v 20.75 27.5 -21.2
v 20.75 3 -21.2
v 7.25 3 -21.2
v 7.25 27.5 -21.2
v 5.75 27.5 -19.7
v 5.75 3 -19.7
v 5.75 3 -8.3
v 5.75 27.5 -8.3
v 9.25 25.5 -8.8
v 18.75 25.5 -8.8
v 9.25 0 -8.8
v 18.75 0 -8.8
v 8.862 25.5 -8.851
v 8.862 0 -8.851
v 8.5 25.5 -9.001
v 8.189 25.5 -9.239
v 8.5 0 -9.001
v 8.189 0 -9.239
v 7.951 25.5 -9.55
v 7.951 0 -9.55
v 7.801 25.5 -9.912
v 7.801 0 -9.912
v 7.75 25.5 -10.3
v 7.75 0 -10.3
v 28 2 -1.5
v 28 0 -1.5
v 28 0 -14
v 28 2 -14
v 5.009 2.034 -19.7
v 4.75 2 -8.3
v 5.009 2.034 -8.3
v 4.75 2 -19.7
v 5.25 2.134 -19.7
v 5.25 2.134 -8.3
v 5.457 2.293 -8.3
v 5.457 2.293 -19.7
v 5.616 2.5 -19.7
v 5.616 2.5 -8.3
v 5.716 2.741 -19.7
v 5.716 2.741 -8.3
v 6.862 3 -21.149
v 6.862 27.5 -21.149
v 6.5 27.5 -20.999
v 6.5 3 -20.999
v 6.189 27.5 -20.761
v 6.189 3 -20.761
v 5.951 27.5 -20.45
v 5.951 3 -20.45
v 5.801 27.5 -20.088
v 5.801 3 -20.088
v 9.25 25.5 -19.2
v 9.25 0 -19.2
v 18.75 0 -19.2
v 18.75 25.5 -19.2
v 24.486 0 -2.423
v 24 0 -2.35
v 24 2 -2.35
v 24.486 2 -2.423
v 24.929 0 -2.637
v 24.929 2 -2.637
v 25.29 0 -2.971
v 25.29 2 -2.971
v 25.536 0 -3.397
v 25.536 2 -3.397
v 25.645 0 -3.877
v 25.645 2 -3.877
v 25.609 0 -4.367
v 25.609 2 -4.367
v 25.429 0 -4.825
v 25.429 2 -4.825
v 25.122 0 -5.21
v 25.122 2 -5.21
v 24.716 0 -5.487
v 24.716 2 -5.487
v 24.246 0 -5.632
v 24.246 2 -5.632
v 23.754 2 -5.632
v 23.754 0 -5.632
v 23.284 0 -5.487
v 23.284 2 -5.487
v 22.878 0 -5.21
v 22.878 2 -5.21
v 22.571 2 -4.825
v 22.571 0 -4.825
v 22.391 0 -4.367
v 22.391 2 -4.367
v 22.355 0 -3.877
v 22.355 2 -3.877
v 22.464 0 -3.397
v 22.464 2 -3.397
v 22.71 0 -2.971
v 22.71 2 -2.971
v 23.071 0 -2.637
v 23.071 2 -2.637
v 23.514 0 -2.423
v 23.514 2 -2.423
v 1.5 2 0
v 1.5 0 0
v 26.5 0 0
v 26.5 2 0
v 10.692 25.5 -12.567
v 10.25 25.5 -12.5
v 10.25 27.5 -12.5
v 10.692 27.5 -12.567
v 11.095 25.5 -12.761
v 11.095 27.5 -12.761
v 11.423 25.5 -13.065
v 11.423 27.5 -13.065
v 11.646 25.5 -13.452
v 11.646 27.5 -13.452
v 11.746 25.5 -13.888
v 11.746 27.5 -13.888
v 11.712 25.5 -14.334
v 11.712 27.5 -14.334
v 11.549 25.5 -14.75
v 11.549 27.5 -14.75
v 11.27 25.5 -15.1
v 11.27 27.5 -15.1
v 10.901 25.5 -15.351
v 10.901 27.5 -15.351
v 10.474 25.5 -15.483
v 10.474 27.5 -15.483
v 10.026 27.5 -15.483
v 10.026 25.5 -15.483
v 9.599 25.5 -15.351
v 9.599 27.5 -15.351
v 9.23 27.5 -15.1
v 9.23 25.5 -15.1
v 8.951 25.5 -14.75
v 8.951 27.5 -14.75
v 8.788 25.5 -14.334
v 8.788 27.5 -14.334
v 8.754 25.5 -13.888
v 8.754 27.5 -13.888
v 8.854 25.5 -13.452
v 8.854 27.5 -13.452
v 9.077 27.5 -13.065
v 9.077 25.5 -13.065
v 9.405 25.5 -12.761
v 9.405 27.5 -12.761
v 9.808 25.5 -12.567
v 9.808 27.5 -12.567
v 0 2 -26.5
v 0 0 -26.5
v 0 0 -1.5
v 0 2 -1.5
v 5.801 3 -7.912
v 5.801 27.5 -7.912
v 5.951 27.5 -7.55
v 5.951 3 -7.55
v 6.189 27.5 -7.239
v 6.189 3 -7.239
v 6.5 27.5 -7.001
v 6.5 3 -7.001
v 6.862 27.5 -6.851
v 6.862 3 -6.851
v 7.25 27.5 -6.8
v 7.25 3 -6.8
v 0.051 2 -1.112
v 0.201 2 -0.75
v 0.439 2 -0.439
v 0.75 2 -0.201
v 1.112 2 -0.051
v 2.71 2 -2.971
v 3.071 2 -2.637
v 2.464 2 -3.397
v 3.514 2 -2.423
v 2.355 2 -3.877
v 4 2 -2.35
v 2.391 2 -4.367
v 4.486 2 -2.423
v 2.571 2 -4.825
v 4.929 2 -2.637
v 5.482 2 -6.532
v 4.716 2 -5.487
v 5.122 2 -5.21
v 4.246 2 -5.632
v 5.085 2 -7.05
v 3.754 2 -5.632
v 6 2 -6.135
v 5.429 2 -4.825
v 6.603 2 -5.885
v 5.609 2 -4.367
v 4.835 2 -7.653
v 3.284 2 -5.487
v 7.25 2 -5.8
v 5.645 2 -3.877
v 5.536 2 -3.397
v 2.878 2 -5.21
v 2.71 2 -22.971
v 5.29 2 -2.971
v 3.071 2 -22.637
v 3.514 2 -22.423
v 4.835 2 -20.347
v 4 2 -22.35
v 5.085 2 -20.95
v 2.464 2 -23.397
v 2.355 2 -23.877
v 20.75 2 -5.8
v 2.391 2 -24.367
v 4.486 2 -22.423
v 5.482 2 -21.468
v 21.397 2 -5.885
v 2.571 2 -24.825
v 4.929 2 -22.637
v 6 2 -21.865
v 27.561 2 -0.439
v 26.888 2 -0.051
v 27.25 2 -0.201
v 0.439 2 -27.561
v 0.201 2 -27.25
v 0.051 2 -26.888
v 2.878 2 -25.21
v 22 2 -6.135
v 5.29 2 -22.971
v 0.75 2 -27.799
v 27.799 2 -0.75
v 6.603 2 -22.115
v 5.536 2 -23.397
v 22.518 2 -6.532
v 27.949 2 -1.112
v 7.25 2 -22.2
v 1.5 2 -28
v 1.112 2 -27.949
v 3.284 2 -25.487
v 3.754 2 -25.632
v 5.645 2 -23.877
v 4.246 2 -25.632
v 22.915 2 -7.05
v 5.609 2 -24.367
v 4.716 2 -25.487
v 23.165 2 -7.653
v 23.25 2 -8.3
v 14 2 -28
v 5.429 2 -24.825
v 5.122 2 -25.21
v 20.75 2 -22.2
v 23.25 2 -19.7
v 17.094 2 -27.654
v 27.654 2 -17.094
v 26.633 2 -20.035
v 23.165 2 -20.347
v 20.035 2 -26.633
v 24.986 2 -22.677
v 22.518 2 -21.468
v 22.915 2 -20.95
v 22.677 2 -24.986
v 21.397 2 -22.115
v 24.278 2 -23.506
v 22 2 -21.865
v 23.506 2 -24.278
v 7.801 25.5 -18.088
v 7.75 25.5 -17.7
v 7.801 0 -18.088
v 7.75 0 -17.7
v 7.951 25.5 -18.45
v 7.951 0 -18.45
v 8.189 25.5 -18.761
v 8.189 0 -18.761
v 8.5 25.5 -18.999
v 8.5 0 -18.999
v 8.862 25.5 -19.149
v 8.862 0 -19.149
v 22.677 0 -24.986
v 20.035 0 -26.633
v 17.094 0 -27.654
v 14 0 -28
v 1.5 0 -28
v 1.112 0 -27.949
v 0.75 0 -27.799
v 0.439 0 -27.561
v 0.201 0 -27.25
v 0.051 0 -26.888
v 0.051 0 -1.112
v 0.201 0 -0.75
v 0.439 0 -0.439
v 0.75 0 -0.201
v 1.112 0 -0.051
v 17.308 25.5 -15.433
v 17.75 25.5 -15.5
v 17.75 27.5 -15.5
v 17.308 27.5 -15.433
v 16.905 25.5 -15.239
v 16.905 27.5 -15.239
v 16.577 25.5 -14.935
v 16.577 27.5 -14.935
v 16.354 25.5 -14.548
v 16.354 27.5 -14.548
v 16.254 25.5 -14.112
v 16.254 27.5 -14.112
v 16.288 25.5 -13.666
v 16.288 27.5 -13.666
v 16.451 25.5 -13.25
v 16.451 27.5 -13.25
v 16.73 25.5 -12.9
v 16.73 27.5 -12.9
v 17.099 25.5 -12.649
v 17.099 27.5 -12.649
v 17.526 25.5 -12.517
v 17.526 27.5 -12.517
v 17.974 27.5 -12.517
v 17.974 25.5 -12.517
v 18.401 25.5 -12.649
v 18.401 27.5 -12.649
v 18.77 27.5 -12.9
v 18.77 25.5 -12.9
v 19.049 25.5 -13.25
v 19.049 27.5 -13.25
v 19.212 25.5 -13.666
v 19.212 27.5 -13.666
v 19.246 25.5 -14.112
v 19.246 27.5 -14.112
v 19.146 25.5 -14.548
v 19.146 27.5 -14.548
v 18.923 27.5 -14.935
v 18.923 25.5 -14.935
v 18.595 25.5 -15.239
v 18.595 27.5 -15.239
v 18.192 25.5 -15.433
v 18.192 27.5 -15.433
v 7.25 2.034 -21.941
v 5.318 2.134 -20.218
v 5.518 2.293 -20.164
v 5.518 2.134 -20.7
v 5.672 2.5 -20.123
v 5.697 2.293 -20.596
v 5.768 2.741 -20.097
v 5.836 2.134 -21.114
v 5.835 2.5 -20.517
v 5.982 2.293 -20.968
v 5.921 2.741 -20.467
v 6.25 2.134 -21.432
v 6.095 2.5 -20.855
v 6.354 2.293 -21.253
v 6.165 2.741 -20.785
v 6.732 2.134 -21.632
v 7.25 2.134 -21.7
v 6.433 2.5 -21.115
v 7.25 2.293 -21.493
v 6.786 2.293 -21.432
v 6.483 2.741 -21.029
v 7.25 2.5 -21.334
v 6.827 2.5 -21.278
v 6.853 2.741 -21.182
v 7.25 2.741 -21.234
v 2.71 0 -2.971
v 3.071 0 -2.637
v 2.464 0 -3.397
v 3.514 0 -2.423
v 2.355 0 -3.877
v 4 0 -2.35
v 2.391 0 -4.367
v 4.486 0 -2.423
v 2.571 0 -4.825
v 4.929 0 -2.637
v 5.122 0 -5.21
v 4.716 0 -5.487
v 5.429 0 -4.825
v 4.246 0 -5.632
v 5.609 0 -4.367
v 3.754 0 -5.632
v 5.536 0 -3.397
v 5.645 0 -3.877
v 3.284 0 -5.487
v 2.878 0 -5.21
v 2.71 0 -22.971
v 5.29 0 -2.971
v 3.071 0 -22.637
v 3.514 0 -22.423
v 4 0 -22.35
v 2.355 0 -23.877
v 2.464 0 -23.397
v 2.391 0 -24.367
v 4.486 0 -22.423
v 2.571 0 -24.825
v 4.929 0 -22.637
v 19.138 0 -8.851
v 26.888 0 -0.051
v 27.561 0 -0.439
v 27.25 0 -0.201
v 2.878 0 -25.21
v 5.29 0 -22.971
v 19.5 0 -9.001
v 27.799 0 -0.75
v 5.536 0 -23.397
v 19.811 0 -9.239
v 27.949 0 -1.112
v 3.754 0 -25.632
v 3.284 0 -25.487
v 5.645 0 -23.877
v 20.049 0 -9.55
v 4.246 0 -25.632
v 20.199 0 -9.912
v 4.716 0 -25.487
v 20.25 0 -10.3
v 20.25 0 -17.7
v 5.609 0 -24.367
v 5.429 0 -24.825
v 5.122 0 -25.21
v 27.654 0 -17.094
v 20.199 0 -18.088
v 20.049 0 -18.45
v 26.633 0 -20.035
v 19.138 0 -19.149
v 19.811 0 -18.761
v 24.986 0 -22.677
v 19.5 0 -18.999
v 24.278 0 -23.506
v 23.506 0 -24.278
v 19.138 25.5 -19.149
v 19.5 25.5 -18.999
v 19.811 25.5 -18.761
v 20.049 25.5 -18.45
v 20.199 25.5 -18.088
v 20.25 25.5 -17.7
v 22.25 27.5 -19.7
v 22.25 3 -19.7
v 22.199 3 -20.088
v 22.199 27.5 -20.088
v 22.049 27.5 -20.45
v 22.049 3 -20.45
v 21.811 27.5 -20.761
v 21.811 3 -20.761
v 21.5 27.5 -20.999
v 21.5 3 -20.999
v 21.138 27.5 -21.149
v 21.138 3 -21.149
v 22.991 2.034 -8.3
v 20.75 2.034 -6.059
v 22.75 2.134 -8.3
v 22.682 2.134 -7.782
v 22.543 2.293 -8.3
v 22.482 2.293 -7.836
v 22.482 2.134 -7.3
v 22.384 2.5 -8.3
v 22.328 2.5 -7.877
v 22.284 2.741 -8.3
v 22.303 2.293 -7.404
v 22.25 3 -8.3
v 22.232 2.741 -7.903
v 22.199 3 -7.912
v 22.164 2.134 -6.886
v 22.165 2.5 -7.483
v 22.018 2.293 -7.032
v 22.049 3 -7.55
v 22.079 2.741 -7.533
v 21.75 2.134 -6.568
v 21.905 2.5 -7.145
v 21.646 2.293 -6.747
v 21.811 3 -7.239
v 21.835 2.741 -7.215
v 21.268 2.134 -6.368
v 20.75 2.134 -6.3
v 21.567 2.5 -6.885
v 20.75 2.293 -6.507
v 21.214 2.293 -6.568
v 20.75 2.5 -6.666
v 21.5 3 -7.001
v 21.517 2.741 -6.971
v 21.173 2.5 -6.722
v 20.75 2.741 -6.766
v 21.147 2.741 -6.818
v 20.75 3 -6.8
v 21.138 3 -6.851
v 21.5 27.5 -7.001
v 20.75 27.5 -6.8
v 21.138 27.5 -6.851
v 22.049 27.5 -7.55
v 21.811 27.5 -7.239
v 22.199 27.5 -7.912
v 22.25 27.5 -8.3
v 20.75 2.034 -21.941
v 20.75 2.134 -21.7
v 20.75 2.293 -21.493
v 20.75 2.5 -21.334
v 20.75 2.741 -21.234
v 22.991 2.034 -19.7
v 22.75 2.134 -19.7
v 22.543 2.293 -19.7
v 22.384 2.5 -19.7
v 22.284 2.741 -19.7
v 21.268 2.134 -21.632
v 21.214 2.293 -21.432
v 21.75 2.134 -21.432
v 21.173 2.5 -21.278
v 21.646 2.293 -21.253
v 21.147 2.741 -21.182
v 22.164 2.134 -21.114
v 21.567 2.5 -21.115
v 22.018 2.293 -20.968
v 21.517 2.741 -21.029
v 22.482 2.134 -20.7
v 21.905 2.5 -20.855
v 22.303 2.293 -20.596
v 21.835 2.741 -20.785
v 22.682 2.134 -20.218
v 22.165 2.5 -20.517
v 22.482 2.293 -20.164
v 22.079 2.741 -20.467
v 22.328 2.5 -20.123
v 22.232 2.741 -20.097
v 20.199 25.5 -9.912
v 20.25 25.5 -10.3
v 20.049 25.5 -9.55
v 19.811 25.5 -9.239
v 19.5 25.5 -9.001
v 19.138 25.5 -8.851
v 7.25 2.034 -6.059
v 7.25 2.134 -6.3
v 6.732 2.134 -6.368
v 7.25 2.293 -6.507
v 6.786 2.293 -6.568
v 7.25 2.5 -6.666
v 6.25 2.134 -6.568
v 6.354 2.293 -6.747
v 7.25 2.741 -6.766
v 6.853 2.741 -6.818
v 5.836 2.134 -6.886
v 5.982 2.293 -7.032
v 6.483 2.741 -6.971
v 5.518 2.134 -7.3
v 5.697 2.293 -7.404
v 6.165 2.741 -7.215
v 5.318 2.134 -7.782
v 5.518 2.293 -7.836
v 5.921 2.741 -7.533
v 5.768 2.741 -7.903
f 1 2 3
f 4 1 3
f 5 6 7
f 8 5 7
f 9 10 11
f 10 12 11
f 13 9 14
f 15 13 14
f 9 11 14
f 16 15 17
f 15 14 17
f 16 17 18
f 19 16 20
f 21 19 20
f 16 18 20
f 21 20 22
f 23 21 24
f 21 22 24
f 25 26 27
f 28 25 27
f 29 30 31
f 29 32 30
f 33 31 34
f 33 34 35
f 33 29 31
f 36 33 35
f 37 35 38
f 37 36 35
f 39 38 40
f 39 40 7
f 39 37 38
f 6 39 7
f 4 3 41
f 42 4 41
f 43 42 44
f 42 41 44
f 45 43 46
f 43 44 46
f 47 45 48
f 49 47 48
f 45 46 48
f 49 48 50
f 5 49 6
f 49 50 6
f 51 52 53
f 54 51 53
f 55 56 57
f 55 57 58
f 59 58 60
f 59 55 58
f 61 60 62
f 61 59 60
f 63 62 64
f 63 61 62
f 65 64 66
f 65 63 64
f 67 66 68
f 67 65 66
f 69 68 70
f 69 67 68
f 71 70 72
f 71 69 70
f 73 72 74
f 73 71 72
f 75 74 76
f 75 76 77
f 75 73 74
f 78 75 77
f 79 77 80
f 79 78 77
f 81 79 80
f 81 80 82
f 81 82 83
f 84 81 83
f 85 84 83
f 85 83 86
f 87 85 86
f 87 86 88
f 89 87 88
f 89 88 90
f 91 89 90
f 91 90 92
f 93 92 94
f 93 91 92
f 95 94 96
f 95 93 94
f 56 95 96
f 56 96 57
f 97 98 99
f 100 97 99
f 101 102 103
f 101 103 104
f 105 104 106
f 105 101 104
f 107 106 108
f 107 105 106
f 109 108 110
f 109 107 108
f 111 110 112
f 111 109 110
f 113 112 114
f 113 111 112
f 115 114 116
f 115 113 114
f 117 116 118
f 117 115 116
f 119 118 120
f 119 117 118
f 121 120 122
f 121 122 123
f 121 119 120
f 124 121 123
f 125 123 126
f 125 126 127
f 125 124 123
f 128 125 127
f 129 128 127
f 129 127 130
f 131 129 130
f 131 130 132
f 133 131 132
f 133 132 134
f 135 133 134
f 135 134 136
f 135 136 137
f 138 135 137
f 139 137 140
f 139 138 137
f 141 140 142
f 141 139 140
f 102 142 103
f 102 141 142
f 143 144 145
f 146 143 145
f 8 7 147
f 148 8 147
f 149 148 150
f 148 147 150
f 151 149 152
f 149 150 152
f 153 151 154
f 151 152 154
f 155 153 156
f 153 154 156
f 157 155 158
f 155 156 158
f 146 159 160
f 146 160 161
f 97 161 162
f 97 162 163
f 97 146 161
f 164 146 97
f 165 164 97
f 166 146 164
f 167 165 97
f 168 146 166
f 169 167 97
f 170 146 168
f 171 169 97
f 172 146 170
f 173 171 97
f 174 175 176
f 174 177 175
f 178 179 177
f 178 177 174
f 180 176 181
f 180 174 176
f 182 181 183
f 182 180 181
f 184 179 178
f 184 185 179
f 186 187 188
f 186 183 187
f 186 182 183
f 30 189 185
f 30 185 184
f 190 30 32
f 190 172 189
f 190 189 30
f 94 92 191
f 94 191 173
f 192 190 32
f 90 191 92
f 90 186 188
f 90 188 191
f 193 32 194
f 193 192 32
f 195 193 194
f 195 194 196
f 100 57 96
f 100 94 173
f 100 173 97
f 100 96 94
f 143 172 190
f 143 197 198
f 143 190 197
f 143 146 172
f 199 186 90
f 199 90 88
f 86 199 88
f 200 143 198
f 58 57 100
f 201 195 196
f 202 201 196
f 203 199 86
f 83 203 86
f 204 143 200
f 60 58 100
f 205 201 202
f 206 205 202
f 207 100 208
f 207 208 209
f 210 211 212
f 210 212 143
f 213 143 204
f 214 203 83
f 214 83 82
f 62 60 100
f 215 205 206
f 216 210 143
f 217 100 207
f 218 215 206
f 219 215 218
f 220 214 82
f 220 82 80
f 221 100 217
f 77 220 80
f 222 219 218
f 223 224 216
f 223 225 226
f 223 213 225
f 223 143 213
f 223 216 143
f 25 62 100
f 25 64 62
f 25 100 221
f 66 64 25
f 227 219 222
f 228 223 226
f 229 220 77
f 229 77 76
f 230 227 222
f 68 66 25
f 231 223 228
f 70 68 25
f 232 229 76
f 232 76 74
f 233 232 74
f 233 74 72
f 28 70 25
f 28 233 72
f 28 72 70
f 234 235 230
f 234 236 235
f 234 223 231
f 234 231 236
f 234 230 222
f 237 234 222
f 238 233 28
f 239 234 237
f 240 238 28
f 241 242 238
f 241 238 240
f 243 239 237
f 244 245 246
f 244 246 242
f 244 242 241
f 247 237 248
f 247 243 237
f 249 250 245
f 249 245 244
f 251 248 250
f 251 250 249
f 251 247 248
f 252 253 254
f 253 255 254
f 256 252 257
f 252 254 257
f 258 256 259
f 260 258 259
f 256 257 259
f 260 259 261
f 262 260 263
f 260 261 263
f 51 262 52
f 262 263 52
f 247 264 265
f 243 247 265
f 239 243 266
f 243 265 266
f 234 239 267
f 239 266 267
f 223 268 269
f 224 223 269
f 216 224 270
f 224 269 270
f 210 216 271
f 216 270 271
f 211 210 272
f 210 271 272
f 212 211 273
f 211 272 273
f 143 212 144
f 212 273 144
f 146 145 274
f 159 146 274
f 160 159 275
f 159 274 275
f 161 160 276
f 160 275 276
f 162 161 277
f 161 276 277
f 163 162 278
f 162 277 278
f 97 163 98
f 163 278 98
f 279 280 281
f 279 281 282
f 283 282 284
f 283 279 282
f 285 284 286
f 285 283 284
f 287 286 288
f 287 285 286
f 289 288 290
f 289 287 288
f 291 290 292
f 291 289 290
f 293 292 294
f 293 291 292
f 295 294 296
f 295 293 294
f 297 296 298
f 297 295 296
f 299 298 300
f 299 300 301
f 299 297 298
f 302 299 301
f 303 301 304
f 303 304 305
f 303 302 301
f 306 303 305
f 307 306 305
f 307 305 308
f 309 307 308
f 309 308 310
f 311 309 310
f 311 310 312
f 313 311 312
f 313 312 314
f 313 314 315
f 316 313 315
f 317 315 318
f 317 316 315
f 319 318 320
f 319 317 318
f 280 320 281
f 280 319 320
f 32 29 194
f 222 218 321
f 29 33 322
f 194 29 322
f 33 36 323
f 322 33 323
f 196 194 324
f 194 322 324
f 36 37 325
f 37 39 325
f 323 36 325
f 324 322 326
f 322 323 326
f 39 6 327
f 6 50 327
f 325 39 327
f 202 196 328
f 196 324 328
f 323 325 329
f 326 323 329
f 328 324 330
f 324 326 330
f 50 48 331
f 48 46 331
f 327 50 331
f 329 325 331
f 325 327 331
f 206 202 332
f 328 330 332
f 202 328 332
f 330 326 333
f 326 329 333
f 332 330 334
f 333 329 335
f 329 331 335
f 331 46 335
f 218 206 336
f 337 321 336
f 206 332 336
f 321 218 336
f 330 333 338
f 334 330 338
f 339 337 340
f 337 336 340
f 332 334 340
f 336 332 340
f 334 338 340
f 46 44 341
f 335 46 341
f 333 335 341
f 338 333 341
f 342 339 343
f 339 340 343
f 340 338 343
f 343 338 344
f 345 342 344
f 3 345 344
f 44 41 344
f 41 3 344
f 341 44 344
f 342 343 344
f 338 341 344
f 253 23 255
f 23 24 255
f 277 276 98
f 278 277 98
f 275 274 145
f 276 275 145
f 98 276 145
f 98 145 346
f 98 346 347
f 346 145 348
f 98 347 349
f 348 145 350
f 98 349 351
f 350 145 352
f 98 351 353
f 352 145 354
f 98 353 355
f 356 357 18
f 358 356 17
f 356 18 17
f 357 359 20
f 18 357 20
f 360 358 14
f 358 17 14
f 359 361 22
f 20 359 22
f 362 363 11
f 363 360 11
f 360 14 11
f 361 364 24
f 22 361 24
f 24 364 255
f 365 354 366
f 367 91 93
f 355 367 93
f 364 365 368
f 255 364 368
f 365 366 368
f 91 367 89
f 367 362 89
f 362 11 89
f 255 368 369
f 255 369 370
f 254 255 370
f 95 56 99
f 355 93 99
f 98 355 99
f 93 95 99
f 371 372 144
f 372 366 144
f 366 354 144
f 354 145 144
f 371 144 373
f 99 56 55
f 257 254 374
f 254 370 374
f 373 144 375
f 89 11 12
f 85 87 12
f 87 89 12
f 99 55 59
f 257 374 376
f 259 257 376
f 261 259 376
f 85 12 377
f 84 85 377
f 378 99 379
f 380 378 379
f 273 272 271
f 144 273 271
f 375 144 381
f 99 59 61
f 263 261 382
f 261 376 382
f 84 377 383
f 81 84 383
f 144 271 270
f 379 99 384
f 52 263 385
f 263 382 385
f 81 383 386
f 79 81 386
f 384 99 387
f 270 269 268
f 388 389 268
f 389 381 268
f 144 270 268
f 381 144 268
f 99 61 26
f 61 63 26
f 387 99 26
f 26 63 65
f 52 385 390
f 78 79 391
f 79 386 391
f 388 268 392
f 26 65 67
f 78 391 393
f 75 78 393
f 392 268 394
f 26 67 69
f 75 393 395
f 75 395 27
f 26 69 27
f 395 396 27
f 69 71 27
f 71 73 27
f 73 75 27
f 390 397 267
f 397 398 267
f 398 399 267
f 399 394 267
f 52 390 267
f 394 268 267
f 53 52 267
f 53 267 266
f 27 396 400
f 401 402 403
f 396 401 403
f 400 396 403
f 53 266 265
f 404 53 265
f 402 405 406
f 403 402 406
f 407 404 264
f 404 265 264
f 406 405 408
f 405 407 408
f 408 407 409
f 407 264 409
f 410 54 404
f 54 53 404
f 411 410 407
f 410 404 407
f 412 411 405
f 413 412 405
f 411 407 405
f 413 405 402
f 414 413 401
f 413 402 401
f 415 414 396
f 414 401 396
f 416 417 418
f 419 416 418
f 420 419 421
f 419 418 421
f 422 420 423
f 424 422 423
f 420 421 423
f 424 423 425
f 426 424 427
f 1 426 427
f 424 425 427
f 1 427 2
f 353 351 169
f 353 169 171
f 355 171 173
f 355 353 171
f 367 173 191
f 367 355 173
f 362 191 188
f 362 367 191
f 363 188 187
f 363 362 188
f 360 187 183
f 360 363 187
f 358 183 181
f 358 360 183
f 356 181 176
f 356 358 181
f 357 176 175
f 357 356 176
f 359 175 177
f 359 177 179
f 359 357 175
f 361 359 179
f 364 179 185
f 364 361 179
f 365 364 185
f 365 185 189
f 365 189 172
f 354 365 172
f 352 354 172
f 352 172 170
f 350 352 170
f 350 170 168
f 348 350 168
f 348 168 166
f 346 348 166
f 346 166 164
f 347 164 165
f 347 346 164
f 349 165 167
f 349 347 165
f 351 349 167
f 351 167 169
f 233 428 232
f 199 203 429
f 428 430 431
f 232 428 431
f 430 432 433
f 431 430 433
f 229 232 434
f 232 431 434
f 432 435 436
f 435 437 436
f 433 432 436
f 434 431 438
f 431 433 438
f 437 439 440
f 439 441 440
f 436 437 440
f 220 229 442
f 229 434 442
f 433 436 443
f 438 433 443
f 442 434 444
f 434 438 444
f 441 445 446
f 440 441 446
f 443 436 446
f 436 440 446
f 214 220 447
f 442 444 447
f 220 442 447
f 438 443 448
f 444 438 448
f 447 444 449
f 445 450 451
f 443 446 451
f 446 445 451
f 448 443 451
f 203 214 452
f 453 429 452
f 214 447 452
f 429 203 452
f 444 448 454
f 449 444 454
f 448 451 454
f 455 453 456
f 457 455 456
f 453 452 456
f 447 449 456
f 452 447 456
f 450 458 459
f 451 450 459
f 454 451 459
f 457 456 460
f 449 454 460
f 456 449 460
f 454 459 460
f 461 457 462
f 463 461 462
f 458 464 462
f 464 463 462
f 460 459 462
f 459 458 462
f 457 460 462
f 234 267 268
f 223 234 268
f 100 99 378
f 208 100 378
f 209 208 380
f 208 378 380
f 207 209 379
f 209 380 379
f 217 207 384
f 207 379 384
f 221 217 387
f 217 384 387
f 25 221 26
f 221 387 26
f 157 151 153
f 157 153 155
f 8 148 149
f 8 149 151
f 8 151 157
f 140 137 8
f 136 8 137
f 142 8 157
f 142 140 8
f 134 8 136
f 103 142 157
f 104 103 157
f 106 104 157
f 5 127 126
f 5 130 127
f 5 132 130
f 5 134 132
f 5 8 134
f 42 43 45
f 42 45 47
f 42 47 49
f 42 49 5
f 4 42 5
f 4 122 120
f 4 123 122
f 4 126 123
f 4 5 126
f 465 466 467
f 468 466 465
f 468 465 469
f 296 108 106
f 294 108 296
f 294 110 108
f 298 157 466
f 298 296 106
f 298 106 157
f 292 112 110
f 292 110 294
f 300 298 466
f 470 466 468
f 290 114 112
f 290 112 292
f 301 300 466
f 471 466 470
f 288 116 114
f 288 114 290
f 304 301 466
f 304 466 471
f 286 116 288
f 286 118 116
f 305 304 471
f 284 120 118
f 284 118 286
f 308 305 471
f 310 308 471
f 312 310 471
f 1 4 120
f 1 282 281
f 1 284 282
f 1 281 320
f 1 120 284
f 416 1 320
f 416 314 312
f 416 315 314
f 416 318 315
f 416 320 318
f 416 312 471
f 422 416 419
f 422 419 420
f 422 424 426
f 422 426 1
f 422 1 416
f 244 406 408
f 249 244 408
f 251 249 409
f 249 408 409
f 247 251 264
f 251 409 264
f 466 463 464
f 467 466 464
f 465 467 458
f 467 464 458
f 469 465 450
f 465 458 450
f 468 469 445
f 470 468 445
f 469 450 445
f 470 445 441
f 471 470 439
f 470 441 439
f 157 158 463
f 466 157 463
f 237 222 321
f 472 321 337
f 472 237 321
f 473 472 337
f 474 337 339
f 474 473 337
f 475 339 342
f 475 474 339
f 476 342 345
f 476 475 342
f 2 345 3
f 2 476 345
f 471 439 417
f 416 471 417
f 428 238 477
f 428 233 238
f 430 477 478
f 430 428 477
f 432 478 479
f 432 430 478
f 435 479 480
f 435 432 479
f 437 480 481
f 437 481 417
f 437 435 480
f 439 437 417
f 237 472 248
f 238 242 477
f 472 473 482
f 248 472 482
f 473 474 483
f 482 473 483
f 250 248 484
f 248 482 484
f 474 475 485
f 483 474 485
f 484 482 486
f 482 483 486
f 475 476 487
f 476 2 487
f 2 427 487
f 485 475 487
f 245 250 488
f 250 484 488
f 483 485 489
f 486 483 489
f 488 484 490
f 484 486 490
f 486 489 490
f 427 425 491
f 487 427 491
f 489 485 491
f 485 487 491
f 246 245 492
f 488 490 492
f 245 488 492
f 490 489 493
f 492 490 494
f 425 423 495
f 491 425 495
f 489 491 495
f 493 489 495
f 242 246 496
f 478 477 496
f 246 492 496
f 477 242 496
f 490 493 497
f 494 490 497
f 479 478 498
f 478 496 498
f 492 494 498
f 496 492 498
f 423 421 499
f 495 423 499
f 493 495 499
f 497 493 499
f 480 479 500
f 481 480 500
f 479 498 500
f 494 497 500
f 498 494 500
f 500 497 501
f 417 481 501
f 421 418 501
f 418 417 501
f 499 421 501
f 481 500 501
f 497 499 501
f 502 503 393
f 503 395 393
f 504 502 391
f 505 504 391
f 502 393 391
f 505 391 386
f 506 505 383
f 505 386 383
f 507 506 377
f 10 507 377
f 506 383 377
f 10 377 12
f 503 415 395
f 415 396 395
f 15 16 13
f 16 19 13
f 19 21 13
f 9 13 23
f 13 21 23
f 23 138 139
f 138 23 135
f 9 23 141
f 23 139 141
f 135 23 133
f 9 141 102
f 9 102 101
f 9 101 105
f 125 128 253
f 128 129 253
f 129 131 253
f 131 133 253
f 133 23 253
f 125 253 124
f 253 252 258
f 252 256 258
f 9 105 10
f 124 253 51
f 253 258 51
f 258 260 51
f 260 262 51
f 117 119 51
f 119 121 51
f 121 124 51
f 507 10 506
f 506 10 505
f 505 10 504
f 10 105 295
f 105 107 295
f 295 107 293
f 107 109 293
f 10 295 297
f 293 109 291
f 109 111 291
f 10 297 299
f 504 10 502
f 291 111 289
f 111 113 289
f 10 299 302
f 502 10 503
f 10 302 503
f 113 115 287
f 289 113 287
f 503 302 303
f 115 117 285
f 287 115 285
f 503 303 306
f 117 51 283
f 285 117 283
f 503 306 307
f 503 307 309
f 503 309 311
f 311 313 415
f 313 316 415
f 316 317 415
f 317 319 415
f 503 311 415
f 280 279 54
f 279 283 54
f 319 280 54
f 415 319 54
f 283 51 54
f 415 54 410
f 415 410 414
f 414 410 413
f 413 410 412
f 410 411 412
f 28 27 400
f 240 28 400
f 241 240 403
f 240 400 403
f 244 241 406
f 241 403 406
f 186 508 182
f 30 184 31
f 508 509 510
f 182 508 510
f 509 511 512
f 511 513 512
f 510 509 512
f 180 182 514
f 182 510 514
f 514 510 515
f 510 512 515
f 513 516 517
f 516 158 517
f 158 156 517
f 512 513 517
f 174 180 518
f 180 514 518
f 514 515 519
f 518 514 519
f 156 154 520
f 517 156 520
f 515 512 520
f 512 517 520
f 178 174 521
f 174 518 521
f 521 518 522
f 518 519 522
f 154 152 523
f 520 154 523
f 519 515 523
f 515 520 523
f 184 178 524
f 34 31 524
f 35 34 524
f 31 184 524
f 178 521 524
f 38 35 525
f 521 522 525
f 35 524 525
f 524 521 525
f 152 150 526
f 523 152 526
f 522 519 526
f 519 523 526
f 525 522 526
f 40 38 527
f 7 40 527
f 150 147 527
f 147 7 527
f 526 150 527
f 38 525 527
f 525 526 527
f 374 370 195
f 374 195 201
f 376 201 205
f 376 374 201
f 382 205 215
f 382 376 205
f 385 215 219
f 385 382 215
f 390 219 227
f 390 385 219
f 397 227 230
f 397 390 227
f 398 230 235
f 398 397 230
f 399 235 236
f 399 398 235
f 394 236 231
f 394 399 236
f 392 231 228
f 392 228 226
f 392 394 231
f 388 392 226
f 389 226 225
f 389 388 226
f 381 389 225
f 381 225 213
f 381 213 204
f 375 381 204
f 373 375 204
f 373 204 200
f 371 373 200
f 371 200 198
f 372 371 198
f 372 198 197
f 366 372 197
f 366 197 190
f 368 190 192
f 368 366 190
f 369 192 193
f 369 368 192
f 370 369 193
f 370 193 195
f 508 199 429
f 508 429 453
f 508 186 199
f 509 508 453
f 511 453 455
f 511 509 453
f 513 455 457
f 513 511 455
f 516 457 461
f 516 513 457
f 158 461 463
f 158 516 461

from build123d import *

# Parameters (mm, degrees)
SKETCH_1_R      = 1.65
EXTRUDE_1_DEPTH = 2
EXTRUDE_3_DEPTH = 23.5
SKETCH_3_R      = 1.5
EXTRUDE_4_DEPTH = 2
FILLET_1_R      = 1


with BuildPart() as part:
    # 草图1 → 凸台-拉伸1 (new body)
    # profile 1 of 2: a face of its own
    with BuildSketch(Plane(origin=(0, 0, 0), x_dir=(1, 0, 0), z_dir=(0, 1, 0))):
        with BuildLine():
            ThreePointArc((0, 1.5), (0.439339828, 0.439339828), (1.5, 0))
            Line((1.5, 0), (26.5, 0))
            ThreePointArc((26.5, 0), (27.560660172, 0.439339828), (28, 1.5))
            Line((28, 1.5), (28, 14))
            ThreePointArc((28, 14), (27.225183212, 18.592878075), (24.986495855, 22.677379145))
            ThreePointArc((24.986495855, 22.677379145), (22.833273811, 22.833273811), (22.677379145, 24.986495855))
            ThreePointArc((22.677379145, 24.986495855), (18.592878075, 27.225183212), (14, 28))
            Line((14, 28), (1.5, 28))
            ThreePointArc((1.5, 28), (0.439339828, 27.560660172), (0, 26.5))
            Line((0, 26.5), (0, 1.5))
        make_face()
        with Locations(Location((4, 4, 0), (0, 0, 270))):
            Circle(SKETCH_1_R, mode=Mode.SUBTRACT)
        with Locations(Location((24, 4, 0), (0, 0, 270))):
            Circle(SKETCH_1_R, mode=Mode.SUBTRACT)
        with Locations(Location((4, 24, 0), (0, 0, 270))):
            Circle(SKETCH_1_R, mode=Mode.SUBTRACT)
        with BuildLine():
            Line((18.75, 8.8), (9.25, 8.8))
            ThreePointArc((9.25, 8.8), (8.189339828, 9.239339828), (7.75, 10.3))
            Line((7.75, 10.3), (7.75, 17.7))
            ThreePointArc((7.75, 17.7), (8.189339828, 18.760660172), (9.25, 19.2))
            Line((9.25, 19.2), (18.75, 19.2))
            ThreePointArc((18.75, 19.2), (19.810660172, 18.760660172), (20.25, 17.7))
            Line((20.25, 17.7), (20.25, 10.3))
            ThreePointArc((20.25, 10.3), (19.810660172, 9.239339828), (18.75, 8.8))
        make_face(mode=Mode.SUBTRACT)
    # profile 2 of 2: a face of its own
    with BuildSketch(Plane(origin=(0, 0, 0), x_dir=(1, 0, 0), z_dir=(0, 1, 0))):
        with BuildLine():
            ThreePointArc((22.677379145, 24.986495855), (22.833273811, 22.833273811), (24.986495855, 22.677379145))
            ThreePointArc((24.986495855, 22.677379145), (23.899494937, 23.899494937), (22.677379145, 24.986495855))
        make_face()
    extrude(amount=EXTRUDE_1_DEPTH)

    # 草图2 → 凸台-拉伸3 (add)
    with BuildSketch(Plane(origin=(0, 2, 0), x_dir=(1, 0, 0), z_dir=(0, 1, 0))):
        with BuildLine():
            Line((7.25, 21.2), (20.75, 21.2))
            ThreePointArc((20.75, 21.2), (21.810660172, 20.760660172), (22.25, 19.7))
            Line((22.25, 19.7), (22.25, 8.3))
            ThreePointArc((22.25, 8.3), (21.810660172, 7.239339828), (20.75, 6.8))
            Line((20.75, 6.8), (7.25, 6.8))
            ThreePointArc((7.25, 6.8), (6.189339828, 7.239339828), (5.75, 8.3))
            Line((5.75, 8.3), (5.75, 19.7))
            ThreePointArc((5.75, 19.7), (6.189339828, 20.760660172), (7.25, 21.2))
        make_face()
        with BuildLine():
            Line((9.25, 19.2), (18.75, 19.2))
            ThreePointArc((18.75, 19.2), (19.810660172, 18.760660172), (20.25, 17.7))
            Line((20.25, 17.7), (20.25, 10.3))
            ThreePointArc((20.25, 10.3), (19.810660172, 9.239339828), (18.75, 8.8))
            Line((18.75, 8.8), (9.25, 8.8))
            ThreePointArc((9.25, 8.8), (8.189339828, 9.239339828), (7.75, 10.3))
            Line((7.75, 10.3), (7.75, 17.7))
            ThreePointArc((7.75, 17.7), (8.189339828, 18.760660172), (9.25, 19.2))
        make_face(mode=Mode.SUBTRACT)
    extrude(amount=EXTRUDE_3_DEPTH)

    # 草图3 → 凸台-拉伸4 (add)
    with BuildSketch(Plane(origin=(0, 25.5, 0), x_dir=(1, 0, 0), z_dir=(0, 1, 0))):
        with BuildLine():
            Line((22.25, 8.3), (22.25, 19.7))
            ThreePointArc((22.25, 19.7), (21.810660172, 20.760660172), (20.75, 21.2))
            Line((20.75, 21.2), (7.25, 21.2))
            ThreePointArc((7.25, 21.2), (6.189339828, 20.760660172), (5.75, 19.7))
            Line((5.75, 19.7), (5.75, 8.3))
            ThreePointArc((5.75, 8.3), (6.189339828, 7.239339828), (7.25, 6.8))
            Line((7.25, 6.8), (20.75, 6.8))
            ThreePointArc((20.75, 6.8), (21.810660172, 7.239339828), (22.25, 8.3))
        make_face()
        with Locations(Location((10.25, 14, 0), (0, 0, 270))):
            Circle(SKETCH_3_R, mode=Mode.SUBTRACT)
        with Locations(Location((17.75, 14, 0), (0, 0, 90))):
            Circle(SKETCH_3_R, mode=Mode.SUBTRACT)
    extrude(amount=EXTRUDE_4_DEPTH)

    # 圆角1
    fillet_1_edges = [part.edges().sort_by_distance(p)[0] for p in [
        (5.75, 2, -14),
        (14, 2, -21.2),
        (22.25, 2, -14),
        (14, 2, -6.8),
        (6.189339828, 2, -7.239339828),
        (21.810660172, 2, -7.239339828),
        (21.810660172, 2, -20.760660172),
        (6.189339828, 2, -20.760660172),
    ]]
    fillet(fillet_1_edges, radius=FILLET_1_R)


solid = part.part
